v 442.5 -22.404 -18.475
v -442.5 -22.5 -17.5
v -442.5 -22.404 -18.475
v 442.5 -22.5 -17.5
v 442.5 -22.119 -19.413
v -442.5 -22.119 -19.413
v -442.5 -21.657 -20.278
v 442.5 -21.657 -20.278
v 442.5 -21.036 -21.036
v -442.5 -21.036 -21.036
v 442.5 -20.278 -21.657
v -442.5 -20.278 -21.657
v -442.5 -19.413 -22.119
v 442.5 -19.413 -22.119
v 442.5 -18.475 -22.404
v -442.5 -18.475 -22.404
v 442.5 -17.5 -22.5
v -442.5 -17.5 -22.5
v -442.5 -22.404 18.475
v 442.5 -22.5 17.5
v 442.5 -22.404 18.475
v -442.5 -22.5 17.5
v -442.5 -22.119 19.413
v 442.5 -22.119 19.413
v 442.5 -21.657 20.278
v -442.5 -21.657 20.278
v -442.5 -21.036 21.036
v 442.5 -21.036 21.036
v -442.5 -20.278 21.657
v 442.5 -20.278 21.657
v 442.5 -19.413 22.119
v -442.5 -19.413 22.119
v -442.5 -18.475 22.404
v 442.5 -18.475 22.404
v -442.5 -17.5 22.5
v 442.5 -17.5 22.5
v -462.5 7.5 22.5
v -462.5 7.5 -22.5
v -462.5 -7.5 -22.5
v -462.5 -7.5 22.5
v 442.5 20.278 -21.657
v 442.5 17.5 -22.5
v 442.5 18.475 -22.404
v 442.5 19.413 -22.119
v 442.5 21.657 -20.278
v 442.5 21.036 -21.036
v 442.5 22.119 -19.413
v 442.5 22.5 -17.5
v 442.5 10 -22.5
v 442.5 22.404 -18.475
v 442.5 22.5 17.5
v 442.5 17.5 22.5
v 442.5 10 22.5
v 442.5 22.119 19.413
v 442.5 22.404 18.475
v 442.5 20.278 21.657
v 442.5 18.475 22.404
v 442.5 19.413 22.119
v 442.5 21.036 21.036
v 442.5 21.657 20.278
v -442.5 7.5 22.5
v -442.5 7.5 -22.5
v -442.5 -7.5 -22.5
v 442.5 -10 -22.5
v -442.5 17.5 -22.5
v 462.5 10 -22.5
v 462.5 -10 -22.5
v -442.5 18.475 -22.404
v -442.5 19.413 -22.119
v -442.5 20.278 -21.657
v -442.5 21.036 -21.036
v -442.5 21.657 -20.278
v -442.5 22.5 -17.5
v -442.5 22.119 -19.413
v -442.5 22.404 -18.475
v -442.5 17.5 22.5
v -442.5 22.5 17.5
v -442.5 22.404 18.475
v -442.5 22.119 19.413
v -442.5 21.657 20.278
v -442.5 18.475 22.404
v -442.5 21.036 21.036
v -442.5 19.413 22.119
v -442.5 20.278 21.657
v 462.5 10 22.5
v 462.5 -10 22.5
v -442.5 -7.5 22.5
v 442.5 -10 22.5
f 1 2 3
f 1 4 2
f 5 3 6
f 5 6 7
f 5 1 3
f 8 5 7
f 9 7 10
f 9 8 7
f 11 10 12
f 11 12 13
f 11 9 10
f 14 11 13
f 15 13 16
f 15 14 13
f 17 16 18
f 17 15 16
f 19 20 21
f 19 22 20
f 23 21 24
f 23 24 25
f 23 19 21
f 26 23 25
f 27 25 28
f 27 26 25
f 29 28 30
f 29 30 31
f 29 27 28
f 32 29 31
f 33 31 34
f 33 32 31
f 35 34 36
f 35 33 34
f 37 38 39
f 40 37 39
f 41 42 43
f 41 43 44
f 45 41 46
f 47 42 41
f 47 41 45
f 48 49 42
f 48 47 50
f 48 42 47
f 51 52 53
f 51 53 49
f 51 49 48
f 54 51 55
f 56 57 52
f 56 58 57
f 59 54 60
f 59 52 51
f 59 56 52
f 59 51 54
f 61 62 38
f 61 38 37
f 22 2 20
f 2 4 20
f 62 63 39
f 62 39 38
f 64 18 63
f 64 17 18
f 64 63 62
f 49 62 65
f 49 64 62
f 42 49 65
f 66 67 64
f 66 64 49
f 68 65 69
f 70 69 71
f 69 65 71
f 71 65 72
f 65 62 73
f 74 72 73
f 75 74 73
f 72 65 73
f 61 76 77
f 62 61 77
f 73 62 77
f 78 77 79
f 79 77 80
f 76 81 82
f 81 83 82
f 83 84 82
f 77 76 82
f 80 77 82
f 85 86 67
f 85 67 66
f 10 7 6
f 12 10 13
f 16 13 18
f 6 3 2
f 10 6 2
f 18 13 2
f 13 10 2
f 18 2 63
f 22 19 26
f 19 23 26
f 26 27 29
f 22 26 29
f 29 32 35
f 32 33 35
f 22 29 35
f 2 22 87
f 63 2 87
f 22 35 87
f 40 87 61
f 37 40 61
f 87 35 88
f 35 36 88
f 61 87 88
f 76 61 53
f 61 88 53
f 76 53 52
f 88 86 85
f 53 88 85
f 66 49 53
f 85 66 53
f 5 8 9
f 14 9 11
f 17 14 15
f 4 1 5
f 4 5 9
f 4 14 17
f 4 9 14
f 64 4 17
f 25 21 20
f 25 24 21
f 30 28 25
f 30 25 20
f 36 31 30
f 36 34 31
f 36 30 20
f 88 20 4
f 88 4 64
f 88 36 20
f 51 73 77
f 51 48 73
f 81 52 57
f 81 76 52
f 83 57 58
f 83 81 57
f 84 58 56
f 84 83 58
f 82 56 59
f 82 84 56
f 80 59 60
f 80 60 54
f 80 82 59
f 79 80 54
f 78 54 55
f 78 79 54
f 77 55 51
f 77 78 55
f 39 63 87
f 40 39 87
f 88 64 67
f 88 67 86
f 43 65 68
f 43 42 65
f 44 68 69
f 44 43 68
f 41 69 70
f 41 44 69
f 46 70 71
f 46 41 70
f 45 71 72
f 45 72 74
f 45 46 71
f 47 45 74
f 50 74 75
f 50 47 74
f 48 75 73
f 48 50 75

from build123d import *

# Parameters (mm, degrees)
F0_W     = 45
F0_H     = 45
F1_DEPTH = 442.5
F2_W     = 20
F2_H     = 45
F3_DEPTH = 20
F4_W     = 15
F4_H     = 45
F5_DEPTH = 20
F6_R     = 5


with BuildPart() as f1:
    # F0 (on Right) → F1 (new body, symmetric)
    with BuildSketch(Plane.YZ):
        Rectangle(F0_W, F0_H)
    extrude(amount=F1_DEPTH, both=True)

    # F2 (on face) → F3 (join)
    with BuildSketch(Plane.YZ.offset(442.5)):
        Rectangle(F2_W, F2_H)
    extrude(amount=F3_DEPTH)

    # F4 (on face) → F5 (join)
    with BuildSketch(Plane(origin=(-442.5, 0, 0), x_dir=(0, -1, 0), z_dir=(-1, 0, 0))):
        Rectangle(F4_W, F4_H)
    extrude(amount=F5_DEPTH)

    # F6
    f6_edges = [f1.edges().sort_by_distance(p)[0] for p in [
        (0, -22.5, 22.5),
        (0, 22.5, 22.5),
        (0, -22.5, -22.5),
        (0, 22.5, -22.5),
    ]]
    fillet(f6_edges, radius=F6_R)


solid = f1.part
